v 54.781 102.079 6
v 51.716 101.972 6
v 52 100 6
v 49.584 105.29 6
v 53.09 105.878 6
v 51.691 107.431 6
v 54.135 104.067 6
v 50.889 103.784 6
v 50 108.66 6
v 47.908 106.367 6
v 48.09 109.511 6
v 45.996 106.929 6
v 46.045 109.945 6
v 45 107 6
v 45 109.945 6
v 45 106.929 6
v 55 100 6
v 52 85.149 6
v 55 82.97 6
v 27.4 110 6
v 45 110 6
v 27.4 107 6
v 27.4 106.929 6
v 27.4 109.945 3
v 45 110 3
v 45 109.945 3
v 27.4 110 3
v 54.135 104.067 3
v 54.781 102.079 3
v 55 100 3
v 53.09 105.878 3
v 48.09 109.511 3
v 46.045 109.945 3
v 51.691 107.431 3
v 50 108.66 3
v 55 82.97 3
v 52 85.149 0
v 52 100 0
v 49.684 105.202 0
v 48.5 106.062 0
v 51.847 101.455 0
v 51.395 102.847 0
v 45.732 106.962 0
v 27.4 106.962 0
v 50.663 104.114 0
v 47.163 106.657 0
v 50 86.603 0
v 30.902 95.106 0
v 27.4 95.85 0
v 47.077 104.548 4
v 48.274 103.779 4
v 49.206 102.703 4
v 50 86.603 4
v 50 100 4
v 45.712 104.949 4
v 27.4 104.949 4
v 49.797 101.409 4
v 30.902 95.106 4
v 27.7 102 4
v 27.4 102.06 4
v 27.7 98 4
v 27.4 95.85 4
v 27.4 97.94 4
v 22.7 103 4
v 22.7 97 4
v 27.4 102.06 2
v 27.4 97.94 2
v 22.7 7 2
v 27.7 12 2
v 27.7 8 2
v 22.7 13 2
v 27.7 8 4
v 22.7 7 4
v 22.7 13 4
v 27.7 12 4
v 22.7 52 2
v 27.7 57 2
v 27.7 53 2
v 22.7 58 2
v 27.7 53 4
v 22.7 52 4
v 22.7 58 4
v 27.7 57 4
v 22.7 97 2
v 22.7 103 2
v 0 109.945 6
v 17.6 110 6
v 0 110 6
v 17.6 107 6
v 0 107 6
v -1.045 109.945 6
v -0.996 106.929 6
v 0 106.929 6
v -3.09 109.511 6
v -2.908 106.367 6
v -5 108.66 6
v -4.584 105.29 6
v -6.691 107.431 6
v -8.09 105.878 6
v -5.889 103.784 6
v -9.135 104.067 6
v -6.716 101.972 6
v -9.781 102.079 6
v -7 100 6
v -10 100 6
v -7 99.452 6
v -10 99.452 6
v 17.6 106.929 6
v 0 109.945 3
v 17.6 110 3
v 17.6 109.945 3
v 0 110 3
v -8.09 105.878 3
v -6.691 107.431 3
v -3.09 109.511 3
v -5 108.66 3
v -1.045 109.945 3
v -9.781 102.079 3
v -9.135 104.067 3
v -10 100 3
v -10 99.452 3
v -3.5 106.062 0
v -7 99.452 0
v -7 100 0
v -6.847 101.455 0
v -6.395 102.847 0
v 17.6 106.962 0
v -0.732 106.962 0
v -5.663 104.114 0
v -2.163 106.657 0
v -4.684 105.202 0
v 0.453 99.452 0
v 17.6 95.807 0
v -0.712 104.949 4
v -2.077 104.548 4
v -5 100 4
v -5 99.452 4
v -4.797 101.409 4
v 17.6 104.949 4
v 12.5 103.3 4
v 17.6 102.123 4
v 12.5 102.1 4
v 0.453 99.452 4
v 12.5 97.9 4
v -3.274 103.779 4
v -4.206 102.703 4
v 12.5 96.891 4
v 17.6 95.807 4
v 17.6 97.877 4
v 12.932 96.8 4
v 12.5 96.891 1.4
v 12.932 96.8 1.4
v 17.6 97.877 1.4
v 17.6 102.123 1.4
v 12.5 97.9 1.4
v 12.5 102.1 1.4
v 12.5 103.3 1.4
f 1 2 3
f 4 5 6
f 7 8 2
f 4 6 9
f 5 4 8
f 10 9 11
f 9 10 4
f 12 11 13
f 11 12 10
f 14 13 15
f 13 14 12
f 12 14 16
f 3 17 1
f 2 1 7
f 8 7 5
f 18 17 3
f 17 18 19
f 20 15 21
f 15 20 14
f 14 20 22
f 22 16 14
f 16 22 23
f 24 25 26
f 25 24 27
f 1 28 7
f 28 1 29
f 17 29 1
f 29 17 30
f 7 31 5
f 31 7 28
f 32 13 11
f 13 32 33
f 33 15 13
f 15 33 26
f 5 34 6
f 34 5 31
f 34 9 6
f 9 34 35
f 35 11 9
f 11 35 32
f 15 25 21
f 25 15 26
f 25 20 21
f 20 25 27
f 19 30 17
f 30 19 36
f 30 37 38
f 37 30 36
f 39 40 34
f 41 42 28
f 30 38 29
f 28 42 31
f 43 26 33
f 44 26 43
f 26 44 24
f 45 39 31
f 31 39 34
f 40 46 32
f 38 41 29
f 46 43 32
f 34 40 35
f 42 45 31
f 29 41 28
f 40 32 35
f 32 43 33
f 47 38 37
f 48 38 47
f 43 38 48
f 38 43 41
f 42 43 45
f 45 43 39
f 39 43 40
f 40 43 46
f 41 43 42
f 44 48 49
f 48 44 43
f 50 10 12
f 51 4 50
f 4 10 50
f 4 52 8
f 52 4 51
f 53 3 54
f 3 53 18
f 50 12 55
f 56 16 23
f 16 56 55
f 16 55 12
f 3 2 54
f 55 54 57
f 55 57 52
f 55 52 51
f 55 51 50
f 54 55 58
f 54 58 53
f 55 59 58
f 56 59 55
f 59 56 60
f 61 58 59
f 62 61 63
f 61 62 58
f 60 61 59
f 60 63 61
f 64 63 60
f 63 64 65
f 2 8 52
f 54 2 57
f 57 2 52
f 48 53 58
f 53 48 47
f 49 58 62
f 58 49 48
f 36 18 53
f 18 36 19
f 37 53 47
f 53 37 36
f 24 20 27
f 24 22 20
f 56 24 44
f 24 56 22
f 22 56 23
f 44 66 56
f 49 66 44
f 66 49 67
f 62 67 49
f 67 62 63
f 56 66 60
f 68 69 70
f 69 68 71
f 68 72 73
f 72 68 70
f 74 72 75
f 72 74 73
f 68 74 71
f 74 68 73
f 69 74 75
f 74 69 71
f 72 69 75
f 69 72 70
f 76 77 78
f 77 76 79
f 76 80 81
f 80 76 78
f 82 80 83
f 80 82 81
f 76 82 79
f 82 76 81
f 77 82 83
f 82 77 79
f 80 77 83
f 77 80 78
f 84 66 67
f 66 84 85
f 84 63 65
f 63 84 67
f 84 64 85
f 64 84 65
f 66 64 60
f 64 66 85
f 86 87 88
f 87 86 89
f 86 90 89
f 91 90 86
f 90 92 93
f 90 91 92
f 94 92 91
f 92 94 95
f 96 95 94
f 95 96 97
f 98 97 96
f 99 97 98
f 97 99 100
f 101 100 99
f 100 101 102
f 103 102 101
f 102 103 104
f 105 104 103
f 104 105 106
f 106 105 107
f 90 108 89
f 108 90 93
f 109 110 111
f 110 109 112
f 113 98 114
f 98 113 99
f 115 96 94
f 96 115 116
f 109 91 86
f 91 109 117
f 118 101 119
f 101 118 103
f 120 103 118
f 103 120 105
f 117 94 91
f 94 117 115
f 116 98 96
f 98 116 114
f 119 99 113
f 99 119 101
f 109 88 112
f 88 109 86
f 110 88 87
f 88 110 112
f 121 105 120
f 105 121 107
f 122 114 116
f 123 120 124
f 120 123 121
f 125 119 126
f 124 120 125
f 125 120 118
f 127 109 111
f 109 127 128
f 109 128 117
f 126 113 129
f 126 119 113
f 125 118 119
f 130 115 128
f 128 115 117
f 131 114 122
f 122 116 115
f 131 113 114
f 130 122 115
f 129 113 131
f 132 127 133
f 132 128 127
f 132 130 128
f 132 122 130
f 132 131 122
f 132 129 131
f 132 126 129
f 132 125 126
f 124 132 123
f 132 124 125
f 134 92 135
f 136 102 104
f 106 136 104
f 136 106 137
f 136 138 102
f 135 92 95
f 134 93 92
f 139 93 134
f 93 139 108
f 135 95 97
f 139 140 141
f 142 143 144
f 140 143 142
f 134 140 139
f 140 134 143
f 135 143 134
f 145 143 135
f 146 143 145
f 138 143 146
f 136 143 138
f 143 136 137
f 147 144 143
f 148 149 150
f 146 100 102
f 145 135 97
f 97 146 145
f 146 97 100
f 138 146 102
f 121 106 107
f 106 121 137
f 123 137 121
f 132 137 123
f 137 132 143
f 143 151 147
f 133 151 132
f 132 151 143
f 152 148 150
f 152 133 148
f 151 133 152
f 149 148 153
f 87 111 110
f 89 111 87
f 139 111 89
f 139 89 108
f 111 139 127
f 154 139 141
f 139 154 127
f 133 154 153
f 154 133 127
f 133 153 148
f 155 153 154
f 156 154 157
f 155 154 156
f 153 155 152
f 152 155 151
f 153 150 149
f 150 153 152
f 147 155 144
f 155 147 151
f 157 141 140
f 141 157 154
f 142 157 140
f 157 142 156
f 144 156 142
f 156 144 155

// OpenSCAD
// file: base.scad
module base(h, width, length, diameter, distance, fn) {
//    diameter=17;
//    distance=52;

    corner_radius=10;

    difference() {
        union() {
            difference() {
                _base_plate_shape(corner_radius, h, width, length, fn);
                translate([3,3,h-2]) {
                    offset=3;
                    _base_plate_shape(corner_radius-offset, h-2, width-offset*2, length-offset*2, fn);
                }
            }
        }

        translate([width/2, length/2-distance/2, -.1]) {
            cylinder(d=diameter, h=h+.2, center=false, $fn=fn);
            translate([0, distance, 0]) {
                cylinder(d=diameter, h=h+.2, center=false, $fn=fn);
            }
        }
    }
}

module rounded_top_only(corner_radius, h, width, length, fn) {
    minkowski() {
        _base_plate_shape(corner_radius, h - corner_radius, width, length, fn);
        translate([0, 0, corner_radius]) cylinder(r=corner_radius/2, h=0.001, $fn=fn);
    }
}

module _base_plate_shape(corner_radius, h, width, length, fn) {
    hs=h/2;
    hn=h-hs;

    translate([0, 0, hs])

    union() {
        translate([corner_radius, 0, 0])
            cube([width - corner_radius * 2, length, hn], center=false);

        translate([0, corner_radius, 0])
            cube([width, length - corner_radius * 2, hn], center=false);

        for (x = [corner_radius, width - corner_radius])
        for (y = [corner_radius, length - corner_radius])
        translate([x, y, 0])
            cylinder(d = corner_radius * 2, h = hn, center = false, $fn = fn);

        // -------

        hull() {
            for (x = [corner_radius, width - corner_radius])
            for (y = [corner_radius, length - corner_radius])
            translate([x, y, 0])
                translate([0, 0, -hs])
                    cylinder(r1=corner_radius-hs, r2=corner_radius, h = hs, center = false, $fn = fn);
        }
    }
}

module nut(h,extend=0) {
    nut_height=h;
    nut_width=5+extend;
    nut_length=4+extend;
    nut_length_=1+extend;
    rotate([0,0,90]) {
        translate([-nut_length/2,0,0]) {
            linear_extrude(height=nut_height)
                polygon(points=[[0,0], [-nut_length_,nut_width], [0,nut_width]]);

            translate([nut_length,0,0]) {
                linear_extrude(height=nut_height)
                    polygon(points=[[0,0], [nut_length_,nut_width], [0,nut_width]]);
            }

            cube([nut_length, nut_width, nut_height], center=false);
        }
    }
}

module both(h, width, length, diameter, distance, nutDistance, separation, fn) {
    left(h, width, length, diameter, distance, nutDistance, fn);

    translate([-separation, 0, 0])
        right(h, width, length, diameter, distance, nutDistance, fn);
}

module left(h, width, length, diameter, distance, nutDistance, fn) {
    union() {
        translate([0, 0, 0]) {
            difference() {
                base(h, width, length, diameter, distance, fn);
                translate([-.1, -.1, -.1]) {
                    cube([width / 2, length + .2, h + .2], center = false);
                }
            }
        }

        translate([0.2,0,2])
            translate([width / 2, 0, 0]) {
                translate([0, nutDistance, 0]) {
                    nut(h - 4);
                }
                translate([0, length / 2, 0]) {
                    nut(h - 4);
                }
                translate([0, length - nutDistance, 0]) {
                    nut(h - 4);
                }
            }
    }
}

module right(h, width, length, diameter, distance, nutDistance, fn) {
    difference() {
        union() {
            difference() {
                base(h, width, length, diameter, distance, fn);
                translate([width / 2 + .1, -.1, -.1]) {
                    cube([width / 2, length + .2, h + .2], center = false);
                }
            }
        }

        translate([0.2,0,1.5])
            translate([width / 2 , 0, -.1]) {
                translate([0, nutDistance, 0]) {
                    nut(h - 1.3, extend = .2);
                }
                translate([0, length / 2, 0]) {
                    nut(h - 1.3, extend = .2);
                }
                translate([0, length - nutDistance, 0]) {
                    nut(h - 1.3, extend =  .2);
                }
            }
    }
}
// main file
use <./base.scad>
h=6;
width=55;
length=110;
fn=200;

a=true; // Part A
b=true;  // Part B

if (a) {
    union() {
        translate([0, 0, 0]) {
            difference() {
                base(h, width, length, fn);
                translate([-.1, -.1, -.1]) {
                    cube([width / 2, length + .2, h + .2], center = false);
                }
            }
        }

        translate([0.2,0,2])
            translate([width / 2, 0, 0]) {
                translate([0, 10, 0]) {
                    nut(h - 4);
                }
                translate([0, length / 2, 0]) {
                    nut(h - 4);
                }
                translate([0, length - 10, 0]) {
                    nut(h - 4);
                }
            }
    }
}

if (b) {
    union() {
        translate([-10, 0, 0]) {
            difference() {
                difference() {
                    base(h, width, length, fn);
                    translate([width / 2 + .1, -.1, -.1]) {
                        cube([width / 2, length + .2, h + .2], center = false);
                    }
                }

                translate([0.2,0,1.5])
                    translate([width / 2 , 0, -.1]) {
                        translate([0, 10, 0]) {
                            nut(h - 1.3, extend = .2);
                        }
                        translate([0, length / 2, 0]) {
                            nut(h - 1.3, extend = .2);
                        }
                        translate([0, length - 10, 0]) {
                            nut(h - 1.3, extend =  .2);
                        }
                    }
            }
        }
    }
}
